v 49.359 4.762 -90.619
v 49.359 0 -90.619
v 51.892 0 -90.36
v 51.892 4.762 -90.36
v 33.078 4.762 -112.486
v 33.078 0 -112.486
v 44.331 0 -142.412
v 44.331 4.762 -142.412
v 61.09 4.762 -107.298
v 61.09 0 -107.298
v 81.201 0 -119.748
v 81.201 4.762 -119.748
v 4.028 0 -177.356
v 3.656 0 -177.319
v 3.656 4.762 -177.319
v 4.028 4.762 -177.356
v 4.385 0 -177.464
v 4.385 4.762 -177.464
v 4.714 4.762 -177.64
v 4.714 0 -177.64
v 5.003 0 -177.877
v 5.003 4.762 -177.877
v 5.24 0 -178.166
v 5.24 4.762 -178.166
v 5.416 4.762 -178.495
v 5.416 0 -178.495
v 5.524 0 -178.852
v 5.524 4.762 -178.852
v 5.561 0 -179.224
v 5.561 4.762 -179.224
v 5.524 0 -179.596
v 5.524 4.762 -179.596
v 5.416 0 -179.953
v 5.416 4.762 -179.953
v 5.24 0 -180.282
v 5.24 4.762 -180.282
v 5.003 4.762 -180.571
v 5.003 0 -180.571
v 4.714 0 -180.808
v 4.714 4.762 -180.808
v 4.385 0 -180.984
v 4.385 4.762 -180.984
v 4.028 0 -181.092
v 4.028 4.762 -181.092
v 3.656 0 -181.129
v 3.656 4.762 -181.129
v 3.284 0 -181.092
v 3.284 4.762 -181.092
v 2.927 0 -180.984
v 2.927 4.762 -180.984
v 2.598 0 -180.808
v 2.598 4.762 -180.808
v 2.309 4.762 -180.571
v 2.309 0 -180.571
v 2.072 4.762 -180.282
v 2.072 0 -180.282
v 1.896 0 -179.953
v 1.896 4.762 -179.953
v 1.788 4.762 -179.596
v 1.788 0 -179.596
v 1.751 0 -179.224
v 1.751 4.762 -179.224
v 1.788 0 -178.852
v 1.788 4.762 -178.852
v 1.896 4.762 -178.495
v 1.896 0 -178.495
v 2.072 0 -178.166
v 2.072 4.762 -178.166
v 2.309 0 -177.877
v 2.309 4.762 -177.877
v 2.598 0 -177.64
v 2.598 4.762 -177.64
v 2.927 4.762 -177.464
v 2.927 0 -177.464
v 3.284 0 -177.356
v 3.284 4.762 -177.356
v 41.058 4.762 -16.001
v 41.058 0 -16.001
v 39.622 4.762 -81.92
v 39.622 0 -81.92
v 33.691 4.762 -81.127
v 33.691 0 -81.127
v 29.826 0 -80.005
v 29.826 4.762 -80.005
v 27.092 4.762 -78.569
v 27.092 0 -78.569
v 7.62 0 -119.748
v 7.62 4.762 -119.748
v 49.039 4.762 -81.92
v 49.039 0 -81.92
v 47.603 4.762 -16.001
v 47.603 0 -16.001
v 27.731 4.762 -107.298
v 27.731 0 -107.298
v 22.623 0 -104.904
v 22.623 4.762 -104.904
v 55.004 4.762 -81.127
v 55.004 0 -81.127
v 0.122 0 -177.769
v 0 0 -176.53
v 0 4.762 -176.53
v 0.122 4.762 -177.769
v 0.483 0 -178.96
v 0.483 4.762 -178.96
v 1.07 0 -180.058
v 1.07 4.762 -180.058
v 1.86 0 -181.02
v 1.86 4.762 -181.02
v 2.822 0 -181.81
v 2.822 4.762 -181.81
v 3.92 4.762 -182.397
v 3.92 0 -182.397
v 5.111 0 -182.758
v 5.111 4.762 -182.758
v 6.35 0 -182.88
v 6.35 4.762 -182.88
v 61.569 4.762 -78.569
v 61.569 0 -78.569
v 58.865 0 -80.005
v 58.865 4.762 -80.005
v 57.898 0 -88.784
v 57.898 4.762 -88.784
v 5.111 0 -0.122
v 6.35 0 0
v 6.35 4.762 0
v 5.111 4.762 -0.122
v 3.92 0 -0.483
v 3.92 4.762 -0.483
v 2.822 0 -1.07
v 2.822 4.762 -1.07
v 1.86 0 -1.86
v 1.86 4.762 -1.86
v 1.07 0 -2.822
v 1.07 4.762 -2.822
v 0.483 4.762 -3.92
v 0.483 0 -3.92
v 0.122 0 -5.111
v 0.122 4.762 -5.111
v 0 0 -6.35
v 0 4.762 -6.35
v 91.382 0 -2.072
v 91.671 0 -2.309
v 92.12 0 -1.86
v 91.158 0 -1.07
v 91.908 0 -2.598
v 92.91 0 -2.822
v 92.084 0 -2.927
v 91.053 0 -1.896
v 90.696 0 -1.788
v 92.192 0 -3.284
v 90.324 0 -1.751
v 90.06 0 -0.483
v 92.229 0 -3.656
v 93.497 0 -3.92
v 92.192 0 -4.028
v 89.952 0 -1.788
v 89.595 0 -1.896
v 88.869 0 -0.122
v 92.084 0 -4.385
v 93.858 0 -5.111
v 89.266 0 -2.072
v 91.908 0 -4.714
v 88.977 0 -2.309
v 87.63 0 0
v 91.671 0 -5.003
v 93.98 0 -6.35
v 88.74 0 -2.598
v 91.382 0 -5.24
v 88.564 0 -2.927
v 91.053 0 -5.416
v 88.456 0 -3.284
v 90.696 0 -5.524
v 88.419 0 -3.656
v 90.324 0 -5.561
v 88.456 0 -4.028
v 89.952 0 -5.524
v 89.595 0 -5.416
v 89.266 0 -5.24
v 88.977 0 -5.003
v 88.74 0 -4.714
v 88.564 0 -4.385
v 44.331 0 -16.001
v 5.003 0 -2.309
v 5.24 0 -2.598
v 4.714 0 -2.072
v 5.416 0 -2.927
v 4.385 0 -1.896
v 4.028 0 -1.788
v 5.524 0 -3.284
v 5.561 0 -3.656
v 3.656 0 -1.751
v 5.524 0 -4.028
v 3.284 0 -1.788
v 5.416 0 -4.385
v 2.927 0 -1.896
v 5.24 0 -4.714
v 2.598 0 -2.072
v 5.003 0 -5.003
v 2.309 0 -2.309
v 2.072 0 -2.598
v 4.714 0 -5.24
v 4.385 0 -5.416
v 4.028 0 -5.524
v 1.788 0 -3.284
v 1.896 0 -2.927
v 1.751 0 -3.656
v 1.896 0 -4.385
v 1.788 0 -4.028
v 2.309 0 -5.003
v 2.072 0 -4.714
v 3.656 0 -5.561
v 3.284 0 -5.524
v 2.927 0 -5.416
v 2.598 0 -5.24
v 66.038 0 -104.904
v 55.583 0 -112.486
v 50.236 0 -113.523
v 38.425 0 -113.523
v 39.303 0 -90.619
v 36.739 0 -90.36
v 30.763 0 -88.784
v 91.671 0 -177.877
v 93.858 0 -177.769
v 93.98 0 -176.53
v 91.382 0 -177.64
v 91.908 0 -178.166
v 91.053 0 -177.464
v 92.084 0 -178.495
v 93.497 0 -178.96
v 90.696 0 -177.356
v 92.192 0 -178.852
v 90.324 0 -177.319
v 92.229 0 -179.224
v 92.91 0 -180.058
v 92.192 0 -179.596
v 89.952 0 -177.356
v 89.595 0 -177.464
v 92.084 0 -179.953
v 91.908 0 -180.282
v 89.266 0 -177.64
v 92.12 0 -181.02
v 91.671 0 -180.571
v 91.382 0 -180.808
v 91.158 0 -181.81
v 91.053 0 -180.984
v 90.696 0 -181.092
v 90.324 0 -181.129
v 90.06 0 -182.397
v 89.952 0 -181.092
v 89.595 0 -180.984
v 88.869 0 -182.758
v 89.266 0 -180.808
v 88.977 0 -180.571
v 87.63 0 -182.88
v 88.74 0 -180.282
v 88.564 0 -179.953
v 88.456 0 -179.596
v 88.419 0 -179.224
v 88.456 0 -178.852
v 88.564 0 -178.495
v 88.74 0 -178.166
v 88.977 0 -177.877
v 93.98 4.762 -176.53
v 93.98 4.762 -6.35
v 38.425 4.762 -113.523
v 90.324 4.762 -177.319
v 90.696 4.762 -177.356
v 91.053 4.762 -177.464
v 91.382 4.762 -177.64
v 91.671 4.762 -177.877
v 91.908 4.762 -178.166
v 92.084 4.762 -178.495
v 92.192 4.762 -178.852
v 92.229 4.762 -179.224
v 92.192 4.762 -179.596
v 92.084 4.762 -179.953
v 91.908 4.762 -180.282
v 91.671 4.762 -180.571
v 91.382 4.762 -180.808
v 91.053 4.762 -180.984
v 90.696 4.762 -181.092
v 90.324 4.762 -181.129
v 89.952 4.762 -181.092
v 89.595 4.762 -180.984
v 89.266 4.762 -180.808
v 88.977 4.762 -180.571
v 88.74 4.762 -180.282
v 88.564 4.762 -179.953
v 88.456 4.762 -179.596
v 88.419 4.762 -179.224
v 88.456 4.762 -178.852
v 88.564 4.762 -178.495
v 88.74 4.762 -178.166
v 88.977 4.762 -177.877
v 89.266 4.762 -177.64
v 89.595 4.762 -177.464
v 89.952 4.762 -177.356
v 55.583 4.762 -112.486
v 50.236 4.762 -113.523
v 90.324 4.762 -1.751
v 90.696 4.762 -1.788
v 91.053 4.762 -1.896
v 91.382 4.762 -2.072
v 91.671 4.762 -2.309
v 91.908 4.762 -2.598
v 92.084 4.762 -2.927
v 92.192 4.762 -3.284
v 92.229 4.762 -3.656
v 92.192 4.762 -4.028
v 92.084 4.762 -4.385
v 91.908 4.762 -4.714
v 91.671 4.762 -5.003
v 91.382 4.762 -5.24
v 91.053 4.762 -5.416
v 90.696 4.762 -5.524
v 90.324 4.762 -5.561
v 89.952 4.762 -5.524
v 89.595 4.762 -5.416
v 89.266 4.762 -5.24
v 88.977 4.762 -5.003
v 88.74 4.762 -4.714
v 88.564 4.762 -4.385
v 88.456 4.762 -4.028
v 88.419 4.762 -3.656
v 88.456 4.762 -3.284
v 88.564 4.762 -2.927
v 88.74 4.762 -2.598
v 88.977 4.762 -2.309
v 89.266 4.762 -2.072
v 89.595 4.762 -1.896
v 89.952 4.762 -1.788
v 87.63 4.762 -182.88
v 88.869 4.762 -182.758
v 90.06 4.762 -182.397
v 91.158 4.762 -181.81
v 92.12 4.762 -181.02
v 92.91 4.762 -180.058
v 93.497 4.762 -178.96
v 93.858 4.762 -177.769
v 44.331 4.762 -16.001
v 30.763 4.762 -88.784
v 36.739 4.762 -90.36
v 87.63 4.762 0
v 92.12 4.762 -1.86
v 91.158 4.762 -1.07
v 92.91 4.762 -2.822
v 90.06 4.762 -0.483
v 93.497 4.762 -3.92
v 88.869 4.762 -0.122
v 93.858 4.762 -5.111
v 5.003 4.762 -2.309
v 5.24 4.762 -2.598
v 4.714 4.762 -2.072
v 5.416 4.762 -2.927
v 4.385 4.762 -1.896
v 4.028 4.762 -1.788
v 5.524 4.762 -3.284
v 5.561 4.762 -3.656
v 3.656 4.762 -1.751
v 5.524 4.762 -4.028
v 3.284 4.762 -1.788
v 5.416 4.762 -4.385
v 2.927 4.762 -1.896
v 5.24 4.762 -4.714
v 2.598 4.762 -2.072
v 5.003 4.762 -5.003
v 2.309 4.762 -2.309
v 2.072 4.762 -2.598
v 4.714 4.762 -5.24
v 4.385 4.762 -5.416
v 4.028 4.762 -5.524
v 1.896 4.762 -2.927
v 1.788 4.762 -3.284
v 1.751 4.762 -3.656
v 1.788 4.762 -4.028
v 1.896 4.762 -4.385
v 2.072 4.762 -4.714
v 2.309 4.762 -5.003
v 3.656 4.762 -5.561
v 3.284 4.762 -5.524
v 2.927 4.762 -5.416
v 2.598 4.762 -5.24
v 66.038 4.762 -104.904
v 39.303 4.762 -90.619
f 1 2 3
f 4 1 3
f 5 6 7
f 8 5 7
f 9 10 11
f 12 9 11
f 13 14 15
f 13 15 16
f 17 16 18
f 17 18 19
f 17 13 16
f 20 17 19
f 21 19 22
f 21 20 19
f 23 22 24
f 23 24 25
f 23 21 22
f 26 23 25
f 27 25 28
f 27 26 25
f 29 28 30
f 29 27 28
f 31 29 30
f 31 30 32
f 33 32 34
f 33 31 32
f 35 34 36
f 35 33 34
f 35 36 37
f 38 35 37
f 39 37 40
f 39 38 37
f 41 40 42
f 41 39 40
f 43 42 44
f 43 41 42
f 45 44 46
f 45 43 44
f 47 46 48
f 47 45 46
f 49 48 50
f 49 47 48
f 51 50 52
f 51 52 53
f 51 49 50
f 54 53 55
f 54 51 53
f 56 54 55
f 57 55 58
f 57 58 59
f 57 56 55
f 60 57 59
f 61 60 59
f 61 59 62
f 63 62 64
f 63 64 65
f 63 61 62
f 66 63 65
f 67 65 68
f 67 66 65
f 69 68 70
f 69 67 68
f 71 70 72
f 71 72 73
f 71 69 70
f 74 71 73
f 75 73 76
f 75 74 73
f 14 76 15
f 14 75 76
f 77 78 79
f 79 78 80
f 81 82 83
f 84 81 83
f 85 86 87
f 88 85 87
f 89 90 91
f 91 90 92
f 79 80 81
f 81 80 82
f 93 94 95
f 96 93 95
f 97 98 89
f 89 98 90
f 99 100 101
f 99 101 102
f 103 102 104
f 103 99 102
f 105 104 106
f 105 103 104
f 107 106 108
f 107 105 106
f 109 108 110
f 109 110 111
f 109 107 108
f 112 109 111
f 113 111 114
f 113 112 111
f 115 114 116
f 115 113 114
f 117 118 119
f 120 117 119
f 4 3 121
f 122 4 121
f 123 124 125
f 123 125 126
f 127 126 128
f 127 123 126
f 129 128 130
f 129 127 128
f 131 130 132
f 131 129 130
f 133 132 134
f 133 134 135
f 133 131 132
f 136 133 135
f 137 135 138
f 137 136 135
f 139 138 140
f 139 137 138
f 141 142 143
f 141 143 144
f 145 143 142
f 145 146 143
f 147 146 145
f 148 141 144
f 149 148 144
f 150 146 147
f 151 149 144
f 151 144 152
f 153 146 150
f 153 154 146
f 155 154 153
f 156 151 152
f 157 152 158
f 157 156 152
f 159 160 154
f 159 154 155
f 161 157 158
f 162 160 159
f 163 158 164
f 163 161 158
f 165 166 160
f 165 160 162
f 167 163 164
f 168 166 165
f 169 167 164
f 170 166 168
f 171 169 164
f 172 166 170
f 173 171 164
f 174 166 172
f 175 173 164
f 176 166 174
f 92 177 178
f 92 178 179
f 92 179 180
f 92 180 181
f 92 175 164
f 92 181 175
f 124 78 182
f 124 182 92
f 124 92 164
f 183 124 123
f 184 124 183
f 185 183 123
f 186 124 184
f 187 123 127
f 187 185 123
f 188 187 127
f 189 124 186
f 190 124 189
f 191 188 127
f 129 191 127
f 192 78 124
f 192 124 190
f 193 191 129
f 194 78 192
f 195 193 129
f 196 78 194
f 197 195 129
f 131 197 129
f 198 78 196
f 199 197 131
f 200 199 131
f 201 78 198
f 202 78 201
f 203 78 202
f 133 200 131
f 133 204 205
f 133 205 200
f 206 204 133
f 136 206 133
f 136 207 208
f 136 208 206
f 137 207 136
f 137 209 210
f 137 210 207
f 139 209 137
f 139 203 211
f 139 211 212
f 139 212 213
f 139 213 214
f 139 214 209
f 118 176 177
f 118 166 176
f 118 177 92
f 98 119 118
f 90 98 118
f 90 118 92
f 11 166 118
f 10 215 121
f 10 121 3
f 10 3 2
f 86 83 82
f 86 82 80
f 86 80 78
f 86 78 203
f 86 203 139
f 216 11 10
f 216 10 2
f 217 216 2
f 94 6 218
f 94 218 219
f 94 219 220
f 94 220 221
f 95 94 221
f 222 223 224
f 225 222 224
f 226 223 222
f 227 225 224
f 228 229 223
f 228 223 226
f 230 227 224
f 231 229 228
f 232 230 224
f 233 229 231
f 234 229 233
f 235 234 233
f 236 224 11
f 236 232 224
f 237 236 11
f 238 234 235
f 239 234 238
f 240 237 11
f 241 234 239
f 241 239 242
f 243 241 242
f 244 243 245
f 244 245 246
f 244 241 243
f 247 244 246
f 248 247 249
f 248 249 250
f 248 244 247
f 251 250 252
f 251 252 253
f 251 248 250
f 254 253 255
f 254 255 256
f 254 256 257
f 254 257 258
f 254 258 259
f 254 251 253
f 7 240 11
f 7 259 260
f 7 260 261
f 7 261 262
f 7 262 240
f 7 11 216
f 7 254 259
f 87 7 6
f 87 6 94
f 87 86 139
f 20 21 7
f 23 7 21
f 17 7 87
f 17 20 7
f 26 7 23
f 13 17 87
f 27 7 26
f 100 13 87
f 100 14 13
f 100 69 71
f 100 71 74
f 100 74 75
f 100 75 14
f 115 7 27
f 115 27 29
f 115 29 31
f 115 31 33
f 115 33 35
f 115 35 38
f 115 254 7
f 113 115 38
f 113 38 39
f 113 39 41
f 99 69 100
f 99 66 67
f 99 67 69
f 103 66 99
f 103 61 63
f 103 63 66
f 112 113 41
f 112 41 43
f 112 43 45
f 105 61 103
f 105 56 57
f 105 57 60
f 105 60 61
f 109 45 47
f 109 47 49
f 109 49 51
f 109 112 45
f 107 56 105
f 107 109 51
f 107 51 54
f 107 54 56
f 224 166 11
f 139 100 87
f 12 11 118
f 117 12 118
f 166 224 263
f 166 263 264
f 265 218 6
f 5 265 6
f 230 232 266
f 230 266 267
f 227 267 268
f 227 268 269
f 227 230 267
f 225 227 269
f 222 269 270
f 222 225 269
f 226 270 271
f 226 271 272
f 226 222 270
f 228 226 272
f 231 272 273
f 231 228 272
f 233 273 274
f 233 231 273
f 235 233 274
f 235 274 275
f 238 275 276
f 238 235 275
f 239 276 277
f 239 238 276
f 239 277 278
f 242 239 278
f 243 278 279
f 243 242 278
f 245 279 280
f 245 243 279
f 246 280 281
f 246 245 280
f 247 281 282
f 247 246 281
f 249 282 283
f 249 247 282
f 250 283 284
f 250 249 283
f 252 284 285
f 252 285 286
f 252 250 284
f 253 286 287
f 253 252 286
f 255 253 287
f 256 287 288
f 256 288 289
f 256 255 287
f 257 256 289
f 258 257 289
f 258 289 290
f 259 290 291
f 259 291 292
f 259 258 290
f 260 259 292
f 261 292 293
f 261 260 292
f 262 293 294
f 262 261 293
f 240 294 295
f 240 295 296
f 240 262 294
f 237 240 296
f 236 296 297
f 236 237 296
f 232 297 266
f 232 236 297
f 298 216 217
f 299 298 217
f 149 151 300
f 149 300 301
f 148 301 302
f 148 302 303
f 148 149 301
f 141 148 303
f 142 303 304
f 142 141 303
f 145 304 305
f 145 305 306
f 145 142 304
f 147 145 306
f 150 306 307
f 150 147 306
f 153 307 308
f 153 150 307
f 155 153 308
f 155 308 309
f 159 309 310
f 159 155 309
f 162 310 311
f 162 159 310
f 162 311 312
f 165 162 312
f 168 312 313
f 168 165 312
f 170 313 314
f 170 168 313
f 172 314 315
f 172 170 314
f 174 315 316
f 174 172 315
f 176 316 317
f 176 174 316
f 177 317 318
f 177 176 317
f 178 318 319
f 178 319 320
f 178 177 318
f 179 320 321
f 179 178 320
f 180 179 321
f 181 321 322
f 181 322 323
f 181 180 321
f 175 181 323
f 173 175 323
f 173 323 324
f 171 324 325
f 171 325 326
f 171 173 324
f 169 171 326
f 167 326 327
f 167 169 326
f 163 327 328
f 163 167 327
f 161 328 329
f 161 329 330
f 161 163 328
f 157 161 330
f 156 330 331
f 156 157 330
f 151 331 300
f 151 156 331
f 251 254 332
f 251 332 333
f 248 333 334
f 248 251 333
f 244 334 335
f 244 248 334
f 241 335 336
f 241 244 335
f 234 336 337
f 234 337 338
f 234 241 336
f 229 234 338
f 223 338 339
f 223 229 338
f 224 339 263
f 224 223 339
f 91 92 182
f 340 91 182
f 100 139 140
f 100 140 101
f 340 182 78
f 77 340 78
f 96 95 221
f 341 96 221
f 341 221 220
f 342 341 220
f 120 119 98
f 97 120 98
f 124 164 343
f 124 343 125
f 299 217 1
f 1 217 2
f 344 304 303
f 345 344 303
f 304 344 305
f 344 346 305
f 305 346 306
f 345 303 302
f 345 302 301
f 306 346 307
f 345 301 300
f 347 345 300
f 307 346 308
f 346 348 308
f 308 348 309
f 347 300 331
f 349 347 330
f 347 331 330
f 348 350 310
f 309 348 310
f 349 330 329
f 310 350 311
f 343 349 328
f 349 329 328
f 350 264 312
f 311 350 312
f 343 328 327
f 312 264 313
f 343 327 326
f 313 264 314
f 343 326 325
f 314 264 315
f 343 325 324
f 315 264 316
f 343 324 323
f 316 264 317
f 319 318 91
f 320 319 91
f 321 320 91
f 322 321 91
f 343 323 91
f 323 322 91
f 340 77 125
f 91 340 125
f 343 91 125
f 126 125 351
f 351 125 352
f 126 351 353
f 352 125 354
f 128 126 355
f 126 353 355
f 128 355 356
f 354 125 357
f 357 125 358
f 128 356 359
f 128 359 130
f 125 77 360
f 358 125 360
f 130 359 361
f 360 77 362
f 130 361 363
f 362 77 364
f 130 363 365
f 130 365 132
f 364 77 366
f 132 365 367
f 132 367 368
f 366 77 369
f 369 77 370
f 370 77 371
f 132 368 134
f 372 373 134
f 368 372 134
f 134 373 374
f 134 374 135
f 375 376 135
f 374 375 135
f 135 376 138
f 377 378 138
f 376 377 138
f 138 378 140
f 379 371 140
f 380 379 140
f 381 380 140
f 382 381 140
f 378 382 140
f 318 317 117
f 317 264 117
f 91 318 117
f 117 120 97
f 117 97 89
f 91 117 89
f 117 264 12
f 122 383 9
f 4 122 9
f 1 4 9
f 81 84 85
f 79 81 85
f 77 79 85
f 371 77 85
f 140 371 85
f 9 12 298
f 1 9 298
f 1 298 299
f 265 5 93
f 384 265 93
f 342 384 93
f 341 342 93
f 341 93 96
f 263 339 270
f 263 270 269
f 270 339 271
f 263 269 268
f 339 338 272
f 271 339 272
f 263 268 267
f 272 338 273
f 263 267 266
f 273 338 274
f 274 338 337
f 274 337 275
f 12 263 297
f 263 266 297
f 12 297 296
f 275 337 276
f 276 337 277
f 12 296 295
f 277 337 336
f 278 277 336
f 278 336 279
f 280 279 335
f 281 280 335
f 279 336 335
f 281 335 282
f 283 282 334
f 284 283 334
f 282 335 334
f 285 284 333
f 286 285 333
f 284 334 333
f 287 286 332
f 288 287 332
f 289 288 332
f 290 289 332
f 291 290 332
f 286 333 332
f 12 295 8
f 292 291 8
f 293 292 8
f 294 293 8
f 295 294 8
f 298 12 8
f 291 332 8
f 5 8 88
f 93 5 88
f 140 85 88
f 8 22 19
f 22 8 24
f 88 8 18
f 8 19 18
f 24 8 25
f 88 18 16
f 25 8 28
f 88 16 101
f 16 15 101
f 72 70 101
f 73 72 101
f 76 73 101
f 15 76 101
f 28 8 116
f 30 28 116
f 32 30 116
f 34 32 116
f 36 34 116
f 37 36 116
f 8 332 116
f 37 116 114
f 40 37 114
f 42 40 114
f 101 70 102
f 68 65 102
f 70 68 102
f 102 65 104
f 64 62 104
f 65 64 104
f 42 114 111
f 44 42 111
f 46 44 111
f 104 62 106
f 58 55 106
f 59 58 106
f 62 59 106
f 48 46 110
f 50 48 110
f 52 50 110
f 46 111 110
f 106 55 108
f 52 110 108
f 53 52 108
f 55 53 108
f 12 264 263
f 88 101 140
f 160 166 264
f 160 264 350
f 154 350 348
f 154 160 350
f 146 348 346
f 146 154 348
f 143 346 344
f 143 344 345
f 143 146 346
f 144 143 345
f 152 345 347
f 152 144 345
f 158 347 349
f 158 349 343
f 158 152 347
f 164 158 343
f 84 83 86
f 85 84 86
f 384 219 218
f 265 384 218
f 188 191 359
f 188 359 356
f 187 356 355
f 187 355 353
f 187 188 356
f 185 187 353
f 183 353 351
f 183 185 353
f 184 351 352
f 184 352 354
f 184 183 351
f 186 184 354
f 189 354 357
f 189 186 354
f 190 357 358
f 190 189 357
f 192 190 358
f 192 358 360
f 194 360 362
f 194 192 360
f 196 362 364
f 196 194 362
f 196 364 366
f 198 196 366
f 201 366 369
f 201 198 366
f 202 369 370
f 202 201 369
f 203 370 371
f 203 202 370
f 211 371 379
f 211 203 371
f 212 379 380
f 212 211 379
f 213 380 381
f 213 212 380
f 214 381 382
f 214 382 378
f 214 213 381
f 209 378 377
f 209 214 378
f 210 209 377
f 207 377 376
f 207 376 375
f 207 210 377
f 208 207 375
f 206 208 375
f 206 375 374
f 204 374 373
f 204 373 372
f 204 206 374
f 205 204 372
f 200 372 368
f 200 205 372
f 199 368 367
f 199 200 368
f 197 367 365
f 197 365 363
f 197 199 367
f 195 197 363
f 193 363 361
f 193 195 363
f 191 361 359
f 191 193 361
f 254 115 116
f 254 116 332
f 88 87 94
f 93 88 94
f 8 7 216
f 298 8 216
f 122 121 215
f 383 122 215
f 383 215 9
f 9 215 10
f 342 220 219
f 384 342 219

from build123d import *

# Parameters (mm, degrees)
SKETCH1_R           = 1.905
BOSS_EXTRUDE1_DEPTH = 4.7625
CUT_EXTRUDE3_DEPTH  = 5.7625


with BuildPart() as part:
    # Sketch1 → Boss-Extrude1 (new body)
    with BuildSketch(Plane(origin=(0, 0, 0), x_dir=(1, 0, 0), z_dir=(0, 1, 0))):
        with BuildLine():
            ThreePointArc((0, 176.53), (1.859871939, 181.020128061), (6.35, 182.88))
            Line((6.35, 182.88), (87.63, 182.88))
            ThreePointArc((87.63, 182.88), (92.120128061, 181.020128061), (93.98, 176.53))
            Line((93.98, 176.53), (93.98, 6.35))
            ThreePointArc((93.98, 6.35), (92.120128061, 1.859871939), (87.63, 0))
            Line((87.63, 0), (6.35, 0))
            ThreePointArc((6.35, 0), (1.859871939, 1.859871939), (0, 6.35))
            Line((0, 6.35), (0, 176.53))
        make_face()
        with Locations(Location((90.324076836, 3.655923164, 0), (0, 0, 270))):  # turned: the seam where the file's is
            Circle(SKETCH1_R, mode=Mode.SUBTRACT)
        with Locations(Location((3.655923164, 3.655923164, 0), (0, 0, 270))):  # turned: the seam where the file's is
            Circle(SKETCH1_R, mode=Mode.SUBTRACT)
        with Locations(Location((90.324076836, 179.224076836, 0), (0, 0, 270))):  # turned: the seam where the file's is
            Circle(SKETCH1_R, mode=Mode.SUBTRACT)
        with Locations(Location((3.655923164, 179.224076836, 0), (0, 0, 270))):  # turned: the seam where the file's is
            Circle(SKETCH1_R, mode=Mode.SUBTRACT)
    extrude(amount=BOSS_EXTRUDE1_DEPTH)

    # Sketch2 → Cut-Extrude3 (cut, through all)
    with BuildSketch(Plane(origin=(0, 0, 0), x_dir=(1, 0, 0), z_dir=(0, 1, 0))):
        Polygon((44.330866221, 142.412423135), (55.583348796, 112.48561291), (50.236412259, 113.523076227), (49.358559843, 90.619091365), (51.892366687, 90.359727043), (57.897684242, 88.783579573), (66.03778893, 104.904168998), (61.089973403, 107.29831442), (81.200790115, 119.747856132), (61.568701793, 78.568503007), (58.865309307, 80.004989053), (55.003504896, 81.127248207), (49.039350105, 81.92031082), (47.602864059, 16.00137357), (44.330866221, 16.001385635), (41.058234971, 16.001385635), (39.621748925, 81.920322885), (33.691252468, 81.127263288), (29.825707906, 80.005004135), (27.092397237, 78.568515072), (7.62, 119.747868197), (27.730816712, 107.298326485), (22.6233101, 104.904181063), (30.763414788, 88.783591638), (36.738802094, 90.359739108), (39.302539188, 90.61910343), (38.424686771, 113.523088292), (33.077750234, 112.485624975), align=None)
    extrude(amount=CUT_EXTRUDE3_DEPTH, mode=Mode.SUBTRACT)


solid = part.part
